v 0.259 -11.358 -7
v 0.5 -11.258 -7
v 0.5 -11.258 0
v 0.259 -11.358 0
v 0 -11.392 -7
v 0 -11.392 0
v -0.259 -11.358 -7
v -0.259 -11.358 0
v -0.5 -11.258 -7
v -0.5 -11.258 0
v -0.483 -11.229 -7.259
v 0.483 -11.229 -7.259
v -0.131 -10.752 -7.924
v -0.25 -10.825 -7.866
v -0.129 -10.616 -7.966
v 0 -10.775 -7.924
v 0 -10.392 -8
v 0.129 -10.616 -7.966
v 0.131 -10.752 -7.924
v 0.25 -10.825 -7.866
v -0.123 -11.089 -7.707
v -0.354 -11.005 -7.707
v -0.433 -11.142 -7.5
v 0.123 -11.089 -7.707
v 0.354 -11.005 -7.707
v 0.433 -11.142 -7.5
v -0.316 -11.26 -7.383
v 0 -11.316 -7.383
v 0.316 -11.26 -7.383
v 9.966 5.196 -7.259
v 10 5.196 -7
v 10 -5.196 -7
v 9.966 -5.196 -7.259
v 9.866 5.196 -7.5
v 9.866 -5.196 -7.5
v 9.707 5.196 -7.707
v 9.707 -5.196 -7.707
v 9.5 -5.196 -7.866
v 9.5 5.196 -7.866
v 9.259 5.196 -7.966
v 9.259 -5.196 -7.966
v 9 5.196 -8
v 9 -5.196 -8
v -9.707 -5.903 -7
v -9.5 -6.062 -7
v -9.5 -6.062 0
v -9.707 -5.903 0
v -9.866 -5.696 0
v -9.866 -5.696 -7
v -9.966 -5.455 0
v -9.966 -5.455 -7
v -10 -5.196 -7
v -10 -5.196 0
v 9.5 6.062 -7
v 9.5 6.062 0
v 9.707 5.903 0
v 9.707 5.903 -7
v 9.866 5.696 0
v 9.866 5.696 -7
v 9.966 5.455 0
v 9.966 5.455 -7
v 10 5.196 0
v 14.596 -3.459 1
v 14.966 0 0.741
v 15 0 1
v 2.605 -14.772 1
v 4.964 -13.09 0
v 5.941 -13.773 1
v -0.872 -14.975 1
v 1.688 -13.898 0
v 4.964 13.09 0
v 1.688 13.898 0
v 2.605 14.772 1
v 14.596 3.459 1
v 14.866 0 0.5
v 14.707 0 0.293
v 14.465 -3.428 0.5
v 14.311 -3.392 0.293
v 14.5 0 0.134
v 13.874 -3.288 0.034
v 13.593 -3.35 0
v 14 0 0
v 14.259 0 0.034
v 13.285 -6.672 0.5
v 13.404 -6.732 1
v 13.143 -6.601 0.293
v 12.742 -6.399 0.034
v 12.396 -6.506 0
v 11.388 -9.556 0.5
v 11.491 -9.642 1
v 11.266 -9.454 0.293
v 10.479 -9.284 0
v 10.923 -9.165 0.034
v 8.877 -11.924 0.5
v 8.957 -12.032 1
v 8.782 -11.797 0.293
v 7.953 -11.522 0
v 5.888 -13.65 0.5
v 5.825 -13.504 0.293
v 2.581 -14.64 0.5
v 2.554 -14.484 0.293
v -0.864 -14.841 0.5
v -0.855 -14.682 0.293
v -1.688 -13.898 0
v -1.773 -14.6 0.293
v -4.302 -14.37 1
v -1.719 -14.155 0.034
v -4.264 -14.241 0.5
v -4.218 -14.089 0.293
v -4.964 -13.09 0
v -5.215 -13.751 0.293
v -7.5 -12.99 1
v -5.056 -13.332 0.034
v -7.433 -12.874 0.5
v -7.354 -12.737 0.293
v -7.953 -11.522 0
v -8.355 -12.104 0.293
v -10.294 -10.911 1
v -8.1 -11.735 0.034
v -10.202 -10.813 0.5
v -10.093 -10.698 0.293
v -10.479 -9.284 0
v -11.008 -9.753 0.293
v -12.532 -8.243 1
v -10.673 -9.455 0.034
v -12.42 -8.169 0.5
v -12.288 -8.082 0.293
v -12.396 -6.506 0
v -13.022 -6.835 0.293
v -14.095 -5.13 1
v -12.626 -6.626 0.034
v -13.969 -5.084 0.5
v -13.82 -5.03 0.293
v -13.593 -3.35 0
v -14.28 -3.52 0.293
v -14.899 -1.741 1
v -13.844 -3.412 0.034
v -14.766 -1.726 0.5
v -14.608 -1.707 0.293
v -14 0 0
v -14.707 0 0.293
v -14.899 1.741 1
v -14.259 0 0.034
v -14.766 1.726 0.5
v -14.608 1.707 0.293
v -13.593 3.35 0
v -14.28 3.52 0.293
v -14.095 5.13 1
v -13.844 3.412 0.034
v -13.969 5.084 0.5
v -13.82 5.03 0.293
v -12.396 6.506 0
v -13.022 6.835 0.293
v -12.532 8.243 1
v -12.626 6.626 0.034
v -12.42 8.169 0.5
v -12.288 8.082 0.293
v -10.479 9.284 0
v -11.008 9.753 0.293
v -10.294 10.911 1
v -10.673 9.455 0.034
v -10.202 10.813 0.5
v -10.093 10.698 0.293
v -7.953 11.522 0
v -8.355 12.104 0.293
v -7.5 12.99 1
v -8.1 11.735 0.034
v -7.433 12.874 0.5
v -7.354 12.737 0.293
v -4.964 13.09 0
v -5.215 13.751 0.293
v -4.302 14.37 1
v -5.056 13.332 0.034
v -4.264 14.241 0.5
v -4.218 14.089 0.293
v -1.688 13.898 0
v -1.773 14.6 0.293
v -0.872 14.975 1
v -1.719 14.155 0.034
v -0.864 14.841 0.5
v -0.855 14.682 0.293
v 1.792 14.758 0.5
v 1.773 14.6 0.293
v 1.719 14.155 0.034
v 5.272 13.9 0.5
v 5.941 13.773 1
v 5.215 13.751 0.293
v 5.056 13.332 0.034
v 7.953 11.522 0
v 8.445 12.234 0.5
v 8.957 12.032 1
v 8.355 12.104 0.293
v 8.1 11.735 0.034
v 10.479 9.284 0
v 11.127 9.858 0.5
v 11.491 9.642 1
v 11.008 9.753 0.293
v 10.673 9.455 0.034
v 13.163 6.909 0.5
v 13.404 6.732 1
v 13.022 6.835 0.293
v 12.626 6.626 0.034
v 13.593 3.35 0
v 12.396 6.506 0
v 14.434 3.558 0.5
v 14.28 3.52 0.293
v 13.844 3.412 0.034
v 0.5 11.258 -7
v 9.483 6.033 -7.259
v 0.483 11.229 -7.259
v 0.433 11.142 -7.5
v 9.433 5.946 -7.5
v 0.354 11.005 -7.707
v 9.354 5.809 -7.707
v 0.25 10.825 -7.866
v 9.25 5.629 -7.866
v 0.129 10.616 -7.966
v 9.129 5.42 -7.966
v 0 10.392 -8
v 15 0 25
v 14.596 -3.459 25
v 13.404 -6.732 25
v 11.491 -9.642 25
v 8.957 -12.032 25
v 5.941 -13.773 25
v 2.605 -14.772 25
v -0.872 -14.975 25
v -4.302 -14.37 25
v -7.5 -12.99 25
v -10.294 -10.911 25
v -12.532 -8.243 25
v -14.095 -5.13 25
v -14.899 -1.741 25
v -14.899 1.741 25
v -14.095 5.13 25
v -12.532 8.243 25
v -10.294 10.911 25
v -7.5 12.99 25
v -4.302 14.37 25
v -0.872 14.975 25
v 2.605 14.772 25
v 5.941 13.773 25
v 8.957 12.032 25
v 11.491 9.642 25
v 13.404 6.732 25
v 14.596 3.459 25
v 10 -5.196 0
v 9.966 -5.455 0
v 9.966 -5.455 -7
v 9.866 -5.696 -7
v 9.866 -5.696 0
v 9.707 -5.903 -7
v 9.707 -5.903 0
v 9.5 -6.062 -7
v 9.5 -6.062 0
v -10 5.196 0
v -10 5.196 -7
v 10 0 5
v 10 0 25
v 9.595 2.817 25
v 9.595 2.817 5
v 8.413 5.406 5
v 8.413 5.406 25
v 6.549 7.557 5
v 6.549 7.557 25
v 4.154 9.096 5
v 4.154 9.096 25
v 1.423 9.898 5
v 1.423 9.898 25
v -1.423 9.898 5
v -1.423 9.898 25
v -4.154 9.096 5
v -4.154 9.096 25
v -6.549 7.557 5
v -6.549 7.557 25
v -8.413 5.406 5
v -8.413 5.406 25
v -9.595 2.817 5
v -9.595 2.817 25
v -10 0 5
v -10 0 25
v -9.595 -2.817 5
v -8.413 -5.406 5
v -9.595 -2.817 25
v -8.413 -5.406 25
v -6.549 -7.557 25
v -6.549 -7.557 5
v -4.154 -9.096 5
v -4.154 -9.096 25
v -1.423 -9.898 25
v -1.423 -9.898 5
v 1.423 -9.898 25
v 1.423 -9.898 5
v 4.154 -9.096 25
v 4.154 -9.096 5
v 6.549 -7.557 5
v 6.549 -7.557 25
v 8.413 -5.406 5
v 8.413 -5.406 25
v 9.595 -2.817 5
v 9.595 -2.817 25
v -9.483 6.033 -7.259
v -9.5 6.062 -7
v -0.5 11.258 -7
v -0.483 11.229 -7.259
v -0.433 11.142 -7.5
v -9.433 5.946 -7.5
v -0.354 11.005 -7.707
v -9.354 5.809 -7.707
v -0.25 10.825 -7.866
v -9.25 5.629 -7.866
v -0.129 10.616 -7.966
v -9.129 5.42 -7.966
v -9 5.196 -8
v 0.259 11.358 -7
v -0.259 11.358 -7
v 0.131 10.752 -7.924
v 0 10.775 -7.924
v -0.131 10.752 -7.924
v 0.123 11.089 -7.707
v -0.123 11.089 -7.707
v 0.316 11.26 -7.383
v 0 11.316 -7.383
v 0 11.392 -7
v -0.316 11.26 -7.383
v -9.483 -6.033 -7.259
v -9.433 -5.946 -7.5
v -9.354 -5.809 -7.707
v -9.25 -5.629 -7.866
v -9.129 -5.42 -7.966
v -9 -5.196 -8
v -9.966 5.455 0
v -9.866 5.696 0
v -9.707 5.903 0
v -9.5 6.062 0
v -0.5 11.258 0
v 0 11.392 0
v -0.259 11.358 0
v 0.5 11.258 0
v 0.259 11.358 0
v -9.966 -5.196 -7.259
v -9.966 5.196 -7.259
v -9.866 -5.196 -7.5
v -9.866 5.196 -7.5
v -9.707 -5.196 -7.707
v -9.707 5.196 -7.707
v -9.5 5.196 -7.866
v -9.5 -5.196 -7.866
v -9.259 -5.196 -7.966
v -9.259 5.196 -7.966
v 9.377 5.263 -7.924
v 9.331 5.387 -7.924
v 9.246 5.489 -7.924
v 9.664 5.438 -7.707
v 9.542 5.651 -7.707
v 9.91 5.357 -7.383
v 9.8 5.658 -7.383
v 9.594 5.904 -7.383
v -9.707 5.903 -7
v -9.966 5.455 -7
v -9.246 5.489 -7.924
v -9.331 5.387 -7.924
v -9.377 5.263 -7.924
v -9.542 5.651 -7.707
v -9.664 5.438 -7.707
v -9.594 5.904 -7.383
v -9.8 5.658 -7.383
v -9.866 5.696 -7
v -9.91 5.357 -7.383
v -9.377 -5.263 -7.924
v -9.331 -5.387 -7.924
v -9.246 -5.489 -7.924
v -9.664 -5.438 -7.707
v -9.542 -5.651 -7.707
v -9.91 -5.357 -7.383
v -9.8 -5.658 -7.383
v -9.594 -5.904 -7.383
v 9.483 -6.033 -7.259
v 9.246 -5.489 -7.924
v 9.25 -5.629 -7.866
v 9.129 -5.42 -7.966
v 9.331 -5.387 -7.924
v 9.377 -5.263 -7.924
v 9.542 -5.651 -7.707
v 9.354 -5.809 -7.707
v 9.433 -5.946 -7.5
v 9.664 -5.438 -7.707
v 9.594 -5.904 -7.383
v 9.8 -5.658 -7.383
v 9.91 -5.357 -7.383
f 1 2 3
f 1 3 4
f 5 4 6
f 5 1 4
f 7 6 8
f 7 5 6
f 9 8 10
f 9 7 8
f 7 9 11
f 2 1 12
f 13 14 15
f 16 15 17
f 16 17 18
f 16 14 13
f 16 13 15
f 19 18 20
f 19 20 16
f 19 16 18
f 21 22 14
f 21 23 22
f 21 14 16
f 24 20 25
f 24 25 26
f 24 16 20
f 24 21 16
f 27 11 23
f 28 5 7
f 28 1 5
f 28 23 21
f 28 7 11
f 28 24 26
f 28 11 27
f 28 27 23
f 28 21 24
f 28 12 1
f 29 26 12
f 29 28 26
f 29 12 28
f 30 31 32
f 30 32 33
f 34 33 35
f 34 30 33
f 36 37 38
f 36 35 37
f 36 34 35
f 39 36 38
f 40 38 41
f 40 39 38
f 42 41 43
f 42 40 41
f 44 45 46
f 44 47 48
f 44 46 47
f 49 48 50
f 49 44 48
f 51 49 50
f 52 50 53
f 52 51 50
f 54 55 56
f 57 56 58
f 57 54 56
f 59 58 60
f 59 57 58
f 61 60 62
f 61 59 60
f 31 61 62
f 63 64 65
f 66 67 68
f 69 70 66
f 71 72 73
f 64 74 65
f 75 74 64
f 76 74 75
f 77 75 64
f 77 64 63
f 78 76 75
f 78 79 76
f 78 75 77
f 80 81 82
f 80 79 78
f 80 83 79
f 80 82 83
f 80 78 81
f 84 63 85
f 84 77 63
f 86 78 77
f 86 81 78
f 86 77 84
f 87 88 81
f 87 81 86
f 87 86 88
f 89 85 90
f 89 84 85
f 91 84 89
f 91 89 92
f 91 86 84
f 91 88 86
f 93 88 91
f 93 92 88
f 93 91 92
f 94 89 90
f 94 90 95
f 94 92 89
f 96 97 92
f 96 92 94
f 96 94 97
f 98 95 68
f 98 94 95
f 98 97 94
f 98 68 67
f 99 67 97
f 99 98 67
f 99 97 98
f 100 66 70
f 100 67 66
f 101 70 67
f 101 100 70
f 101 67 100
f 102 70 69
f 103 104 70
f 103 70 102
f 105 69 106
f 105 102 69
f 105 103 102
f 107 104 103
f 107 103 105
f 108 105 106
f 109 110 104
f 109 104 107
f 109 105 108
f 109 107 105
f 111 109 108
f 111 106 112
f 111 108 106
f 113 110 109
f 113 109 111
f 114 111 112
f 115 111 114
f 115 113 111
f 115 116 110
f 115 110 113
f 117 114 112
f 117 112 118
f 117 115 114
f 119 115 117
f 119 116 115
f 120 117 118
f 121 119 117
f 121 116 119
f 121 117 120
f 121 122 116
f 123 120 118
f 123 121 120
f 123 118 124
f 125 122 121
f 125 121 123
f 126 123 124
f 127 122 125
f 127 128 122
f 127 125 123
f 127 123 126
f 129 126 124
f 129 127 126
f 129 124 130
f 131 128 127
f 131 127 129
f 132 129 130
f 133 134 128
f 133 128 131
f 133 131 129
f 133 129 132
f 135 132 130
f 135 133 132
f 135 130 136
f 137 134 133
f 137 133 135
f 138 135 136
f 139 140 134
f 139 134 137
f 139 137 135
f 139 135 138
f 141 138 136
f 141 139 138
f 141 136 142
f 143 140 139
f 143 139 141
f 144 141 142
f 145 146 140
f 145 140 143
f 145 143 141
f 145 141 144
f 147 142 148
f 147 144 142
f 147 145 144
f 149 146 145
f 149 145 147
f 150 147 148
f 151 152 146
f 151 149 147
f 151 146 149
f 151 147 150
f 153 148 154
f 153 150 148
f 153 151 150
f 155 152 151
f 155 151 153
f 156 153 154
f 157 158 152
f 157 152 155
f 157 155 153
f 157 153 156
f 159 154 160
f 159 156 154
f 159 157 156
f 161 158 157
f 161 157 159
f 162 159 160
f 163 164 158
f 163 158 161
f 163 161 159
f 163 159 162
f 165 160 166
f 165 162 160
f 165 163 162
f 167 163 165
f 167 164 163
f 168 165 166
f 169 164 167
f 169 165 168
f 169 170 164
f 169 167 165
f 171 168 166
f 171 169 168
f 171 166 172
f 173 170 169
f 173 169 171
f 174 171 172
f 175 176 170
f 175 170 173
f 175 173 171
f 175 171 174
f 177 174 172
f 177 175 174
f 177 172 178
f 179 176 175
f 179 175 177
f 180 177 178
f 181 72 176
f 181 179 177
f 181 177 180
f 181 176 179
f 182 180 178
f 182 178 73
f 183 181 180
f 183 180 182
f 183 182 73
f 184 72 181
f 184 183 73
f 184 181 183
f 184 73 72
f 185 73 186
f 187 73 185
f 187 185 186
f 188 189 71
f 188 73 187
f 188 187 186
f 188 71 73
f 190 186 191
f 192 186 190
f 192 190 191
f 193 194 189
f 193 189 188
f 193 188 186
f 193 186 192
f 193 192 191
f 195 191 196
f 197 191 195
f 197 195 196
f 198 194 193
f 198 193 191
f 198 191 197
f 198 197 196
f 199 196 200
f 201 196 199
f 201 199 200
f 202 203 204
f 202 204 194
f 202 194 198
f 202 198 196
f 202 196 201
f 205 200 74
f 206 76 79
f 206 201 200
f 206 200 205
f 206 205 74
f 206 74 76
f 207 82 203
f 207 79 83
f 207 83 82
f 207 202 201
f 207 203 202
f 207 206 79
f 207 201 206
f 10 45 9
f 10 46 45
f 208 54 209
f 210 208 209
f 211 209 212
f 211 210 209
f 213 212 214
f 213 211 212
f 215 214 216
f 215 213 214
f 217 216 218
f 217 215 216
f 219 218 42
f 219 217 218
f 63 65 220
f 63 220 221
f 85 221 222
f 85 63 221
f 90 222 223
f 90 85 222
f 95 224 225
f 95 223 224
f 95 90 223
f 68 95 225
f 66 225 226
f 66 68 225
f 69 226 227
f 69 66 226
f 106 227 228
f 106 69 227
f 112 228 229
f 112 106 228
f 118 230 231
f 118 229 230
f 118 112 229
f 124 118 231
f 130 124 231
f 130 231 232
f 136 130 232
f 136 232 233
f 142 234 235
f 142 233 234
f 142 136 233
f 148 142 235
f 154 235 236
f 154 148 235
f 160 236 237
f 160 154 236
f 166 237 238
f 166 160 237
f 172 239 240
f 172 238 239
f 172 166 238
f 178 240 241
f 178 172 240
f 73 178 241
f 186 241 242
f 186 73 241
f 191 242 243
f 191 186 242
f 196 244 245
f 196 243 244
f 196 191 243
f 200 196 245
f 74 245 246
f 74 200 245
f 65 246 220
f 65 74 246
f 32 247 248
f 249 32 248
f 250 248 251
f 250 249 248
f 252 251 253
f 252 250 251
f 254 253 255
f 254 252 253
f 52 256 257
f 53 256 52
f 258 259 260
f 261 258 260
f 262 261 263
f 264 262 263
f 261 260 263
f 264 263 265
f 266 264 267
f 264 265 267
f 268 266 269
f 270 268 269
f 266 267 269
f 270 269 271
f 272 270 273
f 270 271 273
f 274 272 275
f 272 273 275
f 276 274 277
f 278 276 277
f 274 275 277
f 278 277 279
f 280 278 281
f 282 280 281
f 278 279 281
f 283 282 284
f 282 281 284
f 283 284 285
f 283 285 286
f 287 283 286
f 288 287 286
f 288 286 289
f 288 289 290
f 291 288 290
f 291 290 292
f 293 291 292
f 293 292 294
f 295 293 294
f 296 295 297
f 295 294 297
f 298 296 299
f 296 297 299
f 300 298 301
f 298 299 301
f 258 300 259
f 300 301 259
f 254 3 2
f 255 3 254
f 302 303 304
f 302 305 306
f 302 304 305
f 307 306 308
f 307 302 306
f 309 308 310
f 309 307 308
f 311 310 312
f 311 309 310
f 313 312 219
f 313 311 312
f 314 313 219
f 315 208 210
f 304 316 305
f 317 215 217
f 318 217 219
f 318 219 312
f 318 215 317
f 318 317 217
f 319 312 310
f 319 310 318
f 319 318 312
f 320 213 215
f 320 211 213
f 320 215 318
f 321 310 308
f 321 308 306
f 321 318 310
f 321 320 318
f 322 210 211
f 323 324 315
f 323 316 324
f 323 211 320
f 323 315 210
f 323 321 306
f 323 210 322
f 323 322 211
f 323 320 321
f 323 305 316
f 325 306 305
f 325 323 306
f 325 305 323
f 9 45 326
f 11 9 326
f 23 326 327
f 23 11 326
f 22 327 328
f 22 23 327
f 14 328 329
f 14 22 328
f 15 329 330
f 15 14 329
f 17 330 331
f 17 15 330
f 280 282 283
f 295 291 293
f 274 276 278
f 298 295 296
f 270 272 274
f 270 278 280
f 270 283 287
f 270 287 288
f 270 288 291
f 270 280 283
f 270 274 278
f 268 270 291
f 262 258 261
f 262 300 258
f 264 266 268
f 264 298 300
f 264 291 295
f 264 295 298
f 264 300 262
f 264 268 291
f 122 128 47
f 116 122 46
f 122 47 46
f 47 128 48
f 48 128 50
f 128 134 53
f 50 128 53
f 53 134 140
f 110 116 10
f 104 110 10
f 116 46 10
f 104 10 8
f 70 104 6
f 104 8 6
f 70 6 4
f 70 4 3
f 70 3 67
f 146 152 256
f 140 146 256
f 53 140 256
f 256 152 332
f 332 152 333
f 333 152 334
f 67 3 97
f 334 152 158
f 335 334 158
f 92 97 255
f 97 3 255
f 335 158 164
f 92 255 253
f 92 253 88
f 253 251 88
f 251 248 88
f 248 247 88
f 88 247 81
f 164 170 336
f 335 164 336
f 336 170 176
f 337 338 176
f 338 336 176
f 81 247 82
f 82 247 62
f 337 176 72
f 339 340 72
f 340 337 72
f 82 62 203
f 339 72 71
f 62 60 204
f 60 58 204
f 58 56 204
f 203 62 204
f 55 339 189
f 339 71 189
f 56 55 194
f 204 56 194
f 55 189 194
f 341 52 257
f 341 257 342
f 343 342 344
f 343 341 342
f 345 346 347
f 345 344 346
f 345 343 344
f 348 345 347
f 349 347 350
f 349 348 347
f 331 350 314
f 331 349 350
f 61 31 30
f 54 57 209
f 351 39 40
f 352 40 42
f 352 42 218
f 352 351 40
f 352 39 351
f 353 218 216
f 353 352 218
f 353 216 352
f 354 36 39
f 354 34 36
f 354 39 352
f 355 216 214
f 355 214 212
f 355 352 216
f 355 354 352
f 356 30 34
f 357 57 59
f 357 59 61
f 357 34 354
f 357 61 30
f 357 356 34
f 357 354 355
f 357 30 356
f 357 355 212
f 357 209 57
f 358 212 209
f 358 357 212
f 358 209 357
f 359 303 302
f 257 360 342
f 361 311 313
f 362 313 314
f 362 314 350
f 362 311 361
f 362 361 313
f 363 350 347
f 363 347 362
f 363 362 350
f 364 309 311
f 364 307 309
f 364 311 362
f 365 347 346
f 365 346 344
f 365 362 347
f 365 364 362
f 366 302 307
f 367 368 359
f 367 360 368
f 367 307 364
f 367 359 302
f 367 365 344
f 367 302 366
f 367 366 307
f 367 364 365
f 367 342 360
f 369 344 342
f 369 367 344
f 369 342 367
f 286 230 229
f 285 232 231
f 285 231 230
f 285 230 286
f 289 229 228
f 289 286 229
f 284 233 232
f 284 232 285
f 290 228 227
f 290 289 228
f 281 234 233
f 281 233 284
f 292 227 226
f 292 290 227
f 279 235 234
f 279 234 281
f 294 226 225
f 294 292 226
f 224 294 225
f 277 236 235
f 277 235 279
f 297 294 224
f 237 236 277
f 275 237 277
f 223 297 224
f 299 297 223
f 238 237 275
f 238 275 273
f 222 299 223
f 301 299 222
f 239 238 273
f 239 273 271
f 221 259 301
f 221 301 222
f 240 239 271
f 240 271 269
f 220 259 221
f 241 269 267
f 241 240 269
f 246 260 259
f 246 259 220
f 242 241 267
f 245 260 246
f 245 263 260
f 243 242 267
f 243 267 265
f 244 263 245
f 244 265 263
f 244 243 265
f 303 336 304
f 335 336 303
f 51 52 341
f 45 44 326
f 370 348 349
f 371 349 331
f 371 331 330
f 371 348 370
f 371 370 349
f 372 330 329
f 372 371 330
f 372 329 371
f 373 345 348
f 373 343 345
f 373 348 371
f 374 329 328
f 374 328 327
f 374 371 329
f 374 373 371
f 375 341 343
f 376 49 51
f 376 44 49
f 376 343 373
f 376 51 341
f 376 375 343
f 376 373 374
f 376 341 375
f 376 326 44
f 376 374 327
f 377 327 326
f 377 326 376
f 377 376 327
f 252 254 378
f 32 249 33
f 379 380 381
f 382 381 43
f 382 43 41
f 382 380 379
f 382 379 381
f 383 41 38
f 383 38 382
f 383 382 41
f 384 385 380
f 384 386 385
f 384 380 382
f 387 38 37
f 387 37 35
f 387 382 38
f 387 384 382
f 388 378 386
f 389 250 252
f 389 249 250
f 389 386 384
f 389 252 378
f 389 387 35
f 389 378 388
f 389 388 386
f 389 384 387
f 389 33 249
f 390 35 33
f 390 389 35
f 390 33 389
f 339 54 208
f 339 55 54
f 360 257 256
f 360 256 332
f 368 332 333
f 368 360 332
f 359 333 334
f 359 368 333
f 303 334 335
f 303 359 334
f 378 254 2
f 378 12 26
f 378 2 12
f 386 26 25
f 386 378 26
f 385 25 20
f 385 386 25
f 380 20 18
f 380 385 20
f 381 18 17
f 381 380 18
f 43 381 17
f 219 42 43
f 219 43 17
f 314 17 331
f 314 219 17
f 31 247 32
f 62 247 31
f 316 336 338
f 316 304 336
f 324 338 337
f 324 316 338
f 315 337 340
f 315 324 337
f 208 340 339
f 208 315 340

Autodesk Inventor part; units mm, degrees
ref_plane "YZ Plane" through (0, 0, 0) normal (1, 0, 0) x (0, 1, 0)
ref_plane "XZ Plane" through (0, 0, 0) normal (0, 1, 0) x (-1, 0, 0)
ref_plane "XY Plane" through (0, 0, 0) normal (0, 0, 1) x (1, 0, 0)
sketch "草图1" plane through (0, 0, 0) normal (0, 0, 1) x (1, 0, 0)
  circle A0 centre (0, 0) radius 15
  dimension "d0" = 30
extrude "拉伸1" add sketch "草图1" along normal blind 25
sketch "草图2" plane through (0, 0, 25) normal (0, 0, 1) x (1, 0, 0)
  circle A0 centre (0, 0) radius 10
  dimension "d3" = 20
extrude "拉伸2" cut sketch "草图2" against normal blind 20
thread "螺纹1" size "M20x2.5" class "6H" standard "ANSI Metric M Profile" full length
sketch "草图3" plane through (0, 0, 0) normal (0, 0, -1) x (-1, 0, 0)
  line L0 (10, 5.7735) -> (10, -5.7735)
  line L1 (10, -5.7735) -> (0, -11.547)
  line L2 (0, -11.547) -> (-10, -5.7735)
  line L3 (-10, -5.7735) -> (-10, 5.7735)
  line L4 (-10, 5.7735) -> (0, 11.547)
  line L5 (0, 11.547) -> (10, 5.7735)
  line L6 (0, 0) -> (-10, 0)
  dimension "d8" = 20
extrude "拉伸3" add sketch "草图3" along normal blind 8
fillet "圆角1" radius 1 13 edges at (-15, 0, 0) (5, 8.6603, -8) (-5, 8.6603, -8) (-10, 0, -8) (-5, -8.6603, -8) (5, -8.6603, -8) (10, 0, -8) (10, 5.7735, -4) (0, 11.547, -4) (-10, 5.7735, -4) (-10, -5.7735, -4) (0, -11.547, -4) (10, -5.7735, -4)
properties part number "水箱出水口盖"
